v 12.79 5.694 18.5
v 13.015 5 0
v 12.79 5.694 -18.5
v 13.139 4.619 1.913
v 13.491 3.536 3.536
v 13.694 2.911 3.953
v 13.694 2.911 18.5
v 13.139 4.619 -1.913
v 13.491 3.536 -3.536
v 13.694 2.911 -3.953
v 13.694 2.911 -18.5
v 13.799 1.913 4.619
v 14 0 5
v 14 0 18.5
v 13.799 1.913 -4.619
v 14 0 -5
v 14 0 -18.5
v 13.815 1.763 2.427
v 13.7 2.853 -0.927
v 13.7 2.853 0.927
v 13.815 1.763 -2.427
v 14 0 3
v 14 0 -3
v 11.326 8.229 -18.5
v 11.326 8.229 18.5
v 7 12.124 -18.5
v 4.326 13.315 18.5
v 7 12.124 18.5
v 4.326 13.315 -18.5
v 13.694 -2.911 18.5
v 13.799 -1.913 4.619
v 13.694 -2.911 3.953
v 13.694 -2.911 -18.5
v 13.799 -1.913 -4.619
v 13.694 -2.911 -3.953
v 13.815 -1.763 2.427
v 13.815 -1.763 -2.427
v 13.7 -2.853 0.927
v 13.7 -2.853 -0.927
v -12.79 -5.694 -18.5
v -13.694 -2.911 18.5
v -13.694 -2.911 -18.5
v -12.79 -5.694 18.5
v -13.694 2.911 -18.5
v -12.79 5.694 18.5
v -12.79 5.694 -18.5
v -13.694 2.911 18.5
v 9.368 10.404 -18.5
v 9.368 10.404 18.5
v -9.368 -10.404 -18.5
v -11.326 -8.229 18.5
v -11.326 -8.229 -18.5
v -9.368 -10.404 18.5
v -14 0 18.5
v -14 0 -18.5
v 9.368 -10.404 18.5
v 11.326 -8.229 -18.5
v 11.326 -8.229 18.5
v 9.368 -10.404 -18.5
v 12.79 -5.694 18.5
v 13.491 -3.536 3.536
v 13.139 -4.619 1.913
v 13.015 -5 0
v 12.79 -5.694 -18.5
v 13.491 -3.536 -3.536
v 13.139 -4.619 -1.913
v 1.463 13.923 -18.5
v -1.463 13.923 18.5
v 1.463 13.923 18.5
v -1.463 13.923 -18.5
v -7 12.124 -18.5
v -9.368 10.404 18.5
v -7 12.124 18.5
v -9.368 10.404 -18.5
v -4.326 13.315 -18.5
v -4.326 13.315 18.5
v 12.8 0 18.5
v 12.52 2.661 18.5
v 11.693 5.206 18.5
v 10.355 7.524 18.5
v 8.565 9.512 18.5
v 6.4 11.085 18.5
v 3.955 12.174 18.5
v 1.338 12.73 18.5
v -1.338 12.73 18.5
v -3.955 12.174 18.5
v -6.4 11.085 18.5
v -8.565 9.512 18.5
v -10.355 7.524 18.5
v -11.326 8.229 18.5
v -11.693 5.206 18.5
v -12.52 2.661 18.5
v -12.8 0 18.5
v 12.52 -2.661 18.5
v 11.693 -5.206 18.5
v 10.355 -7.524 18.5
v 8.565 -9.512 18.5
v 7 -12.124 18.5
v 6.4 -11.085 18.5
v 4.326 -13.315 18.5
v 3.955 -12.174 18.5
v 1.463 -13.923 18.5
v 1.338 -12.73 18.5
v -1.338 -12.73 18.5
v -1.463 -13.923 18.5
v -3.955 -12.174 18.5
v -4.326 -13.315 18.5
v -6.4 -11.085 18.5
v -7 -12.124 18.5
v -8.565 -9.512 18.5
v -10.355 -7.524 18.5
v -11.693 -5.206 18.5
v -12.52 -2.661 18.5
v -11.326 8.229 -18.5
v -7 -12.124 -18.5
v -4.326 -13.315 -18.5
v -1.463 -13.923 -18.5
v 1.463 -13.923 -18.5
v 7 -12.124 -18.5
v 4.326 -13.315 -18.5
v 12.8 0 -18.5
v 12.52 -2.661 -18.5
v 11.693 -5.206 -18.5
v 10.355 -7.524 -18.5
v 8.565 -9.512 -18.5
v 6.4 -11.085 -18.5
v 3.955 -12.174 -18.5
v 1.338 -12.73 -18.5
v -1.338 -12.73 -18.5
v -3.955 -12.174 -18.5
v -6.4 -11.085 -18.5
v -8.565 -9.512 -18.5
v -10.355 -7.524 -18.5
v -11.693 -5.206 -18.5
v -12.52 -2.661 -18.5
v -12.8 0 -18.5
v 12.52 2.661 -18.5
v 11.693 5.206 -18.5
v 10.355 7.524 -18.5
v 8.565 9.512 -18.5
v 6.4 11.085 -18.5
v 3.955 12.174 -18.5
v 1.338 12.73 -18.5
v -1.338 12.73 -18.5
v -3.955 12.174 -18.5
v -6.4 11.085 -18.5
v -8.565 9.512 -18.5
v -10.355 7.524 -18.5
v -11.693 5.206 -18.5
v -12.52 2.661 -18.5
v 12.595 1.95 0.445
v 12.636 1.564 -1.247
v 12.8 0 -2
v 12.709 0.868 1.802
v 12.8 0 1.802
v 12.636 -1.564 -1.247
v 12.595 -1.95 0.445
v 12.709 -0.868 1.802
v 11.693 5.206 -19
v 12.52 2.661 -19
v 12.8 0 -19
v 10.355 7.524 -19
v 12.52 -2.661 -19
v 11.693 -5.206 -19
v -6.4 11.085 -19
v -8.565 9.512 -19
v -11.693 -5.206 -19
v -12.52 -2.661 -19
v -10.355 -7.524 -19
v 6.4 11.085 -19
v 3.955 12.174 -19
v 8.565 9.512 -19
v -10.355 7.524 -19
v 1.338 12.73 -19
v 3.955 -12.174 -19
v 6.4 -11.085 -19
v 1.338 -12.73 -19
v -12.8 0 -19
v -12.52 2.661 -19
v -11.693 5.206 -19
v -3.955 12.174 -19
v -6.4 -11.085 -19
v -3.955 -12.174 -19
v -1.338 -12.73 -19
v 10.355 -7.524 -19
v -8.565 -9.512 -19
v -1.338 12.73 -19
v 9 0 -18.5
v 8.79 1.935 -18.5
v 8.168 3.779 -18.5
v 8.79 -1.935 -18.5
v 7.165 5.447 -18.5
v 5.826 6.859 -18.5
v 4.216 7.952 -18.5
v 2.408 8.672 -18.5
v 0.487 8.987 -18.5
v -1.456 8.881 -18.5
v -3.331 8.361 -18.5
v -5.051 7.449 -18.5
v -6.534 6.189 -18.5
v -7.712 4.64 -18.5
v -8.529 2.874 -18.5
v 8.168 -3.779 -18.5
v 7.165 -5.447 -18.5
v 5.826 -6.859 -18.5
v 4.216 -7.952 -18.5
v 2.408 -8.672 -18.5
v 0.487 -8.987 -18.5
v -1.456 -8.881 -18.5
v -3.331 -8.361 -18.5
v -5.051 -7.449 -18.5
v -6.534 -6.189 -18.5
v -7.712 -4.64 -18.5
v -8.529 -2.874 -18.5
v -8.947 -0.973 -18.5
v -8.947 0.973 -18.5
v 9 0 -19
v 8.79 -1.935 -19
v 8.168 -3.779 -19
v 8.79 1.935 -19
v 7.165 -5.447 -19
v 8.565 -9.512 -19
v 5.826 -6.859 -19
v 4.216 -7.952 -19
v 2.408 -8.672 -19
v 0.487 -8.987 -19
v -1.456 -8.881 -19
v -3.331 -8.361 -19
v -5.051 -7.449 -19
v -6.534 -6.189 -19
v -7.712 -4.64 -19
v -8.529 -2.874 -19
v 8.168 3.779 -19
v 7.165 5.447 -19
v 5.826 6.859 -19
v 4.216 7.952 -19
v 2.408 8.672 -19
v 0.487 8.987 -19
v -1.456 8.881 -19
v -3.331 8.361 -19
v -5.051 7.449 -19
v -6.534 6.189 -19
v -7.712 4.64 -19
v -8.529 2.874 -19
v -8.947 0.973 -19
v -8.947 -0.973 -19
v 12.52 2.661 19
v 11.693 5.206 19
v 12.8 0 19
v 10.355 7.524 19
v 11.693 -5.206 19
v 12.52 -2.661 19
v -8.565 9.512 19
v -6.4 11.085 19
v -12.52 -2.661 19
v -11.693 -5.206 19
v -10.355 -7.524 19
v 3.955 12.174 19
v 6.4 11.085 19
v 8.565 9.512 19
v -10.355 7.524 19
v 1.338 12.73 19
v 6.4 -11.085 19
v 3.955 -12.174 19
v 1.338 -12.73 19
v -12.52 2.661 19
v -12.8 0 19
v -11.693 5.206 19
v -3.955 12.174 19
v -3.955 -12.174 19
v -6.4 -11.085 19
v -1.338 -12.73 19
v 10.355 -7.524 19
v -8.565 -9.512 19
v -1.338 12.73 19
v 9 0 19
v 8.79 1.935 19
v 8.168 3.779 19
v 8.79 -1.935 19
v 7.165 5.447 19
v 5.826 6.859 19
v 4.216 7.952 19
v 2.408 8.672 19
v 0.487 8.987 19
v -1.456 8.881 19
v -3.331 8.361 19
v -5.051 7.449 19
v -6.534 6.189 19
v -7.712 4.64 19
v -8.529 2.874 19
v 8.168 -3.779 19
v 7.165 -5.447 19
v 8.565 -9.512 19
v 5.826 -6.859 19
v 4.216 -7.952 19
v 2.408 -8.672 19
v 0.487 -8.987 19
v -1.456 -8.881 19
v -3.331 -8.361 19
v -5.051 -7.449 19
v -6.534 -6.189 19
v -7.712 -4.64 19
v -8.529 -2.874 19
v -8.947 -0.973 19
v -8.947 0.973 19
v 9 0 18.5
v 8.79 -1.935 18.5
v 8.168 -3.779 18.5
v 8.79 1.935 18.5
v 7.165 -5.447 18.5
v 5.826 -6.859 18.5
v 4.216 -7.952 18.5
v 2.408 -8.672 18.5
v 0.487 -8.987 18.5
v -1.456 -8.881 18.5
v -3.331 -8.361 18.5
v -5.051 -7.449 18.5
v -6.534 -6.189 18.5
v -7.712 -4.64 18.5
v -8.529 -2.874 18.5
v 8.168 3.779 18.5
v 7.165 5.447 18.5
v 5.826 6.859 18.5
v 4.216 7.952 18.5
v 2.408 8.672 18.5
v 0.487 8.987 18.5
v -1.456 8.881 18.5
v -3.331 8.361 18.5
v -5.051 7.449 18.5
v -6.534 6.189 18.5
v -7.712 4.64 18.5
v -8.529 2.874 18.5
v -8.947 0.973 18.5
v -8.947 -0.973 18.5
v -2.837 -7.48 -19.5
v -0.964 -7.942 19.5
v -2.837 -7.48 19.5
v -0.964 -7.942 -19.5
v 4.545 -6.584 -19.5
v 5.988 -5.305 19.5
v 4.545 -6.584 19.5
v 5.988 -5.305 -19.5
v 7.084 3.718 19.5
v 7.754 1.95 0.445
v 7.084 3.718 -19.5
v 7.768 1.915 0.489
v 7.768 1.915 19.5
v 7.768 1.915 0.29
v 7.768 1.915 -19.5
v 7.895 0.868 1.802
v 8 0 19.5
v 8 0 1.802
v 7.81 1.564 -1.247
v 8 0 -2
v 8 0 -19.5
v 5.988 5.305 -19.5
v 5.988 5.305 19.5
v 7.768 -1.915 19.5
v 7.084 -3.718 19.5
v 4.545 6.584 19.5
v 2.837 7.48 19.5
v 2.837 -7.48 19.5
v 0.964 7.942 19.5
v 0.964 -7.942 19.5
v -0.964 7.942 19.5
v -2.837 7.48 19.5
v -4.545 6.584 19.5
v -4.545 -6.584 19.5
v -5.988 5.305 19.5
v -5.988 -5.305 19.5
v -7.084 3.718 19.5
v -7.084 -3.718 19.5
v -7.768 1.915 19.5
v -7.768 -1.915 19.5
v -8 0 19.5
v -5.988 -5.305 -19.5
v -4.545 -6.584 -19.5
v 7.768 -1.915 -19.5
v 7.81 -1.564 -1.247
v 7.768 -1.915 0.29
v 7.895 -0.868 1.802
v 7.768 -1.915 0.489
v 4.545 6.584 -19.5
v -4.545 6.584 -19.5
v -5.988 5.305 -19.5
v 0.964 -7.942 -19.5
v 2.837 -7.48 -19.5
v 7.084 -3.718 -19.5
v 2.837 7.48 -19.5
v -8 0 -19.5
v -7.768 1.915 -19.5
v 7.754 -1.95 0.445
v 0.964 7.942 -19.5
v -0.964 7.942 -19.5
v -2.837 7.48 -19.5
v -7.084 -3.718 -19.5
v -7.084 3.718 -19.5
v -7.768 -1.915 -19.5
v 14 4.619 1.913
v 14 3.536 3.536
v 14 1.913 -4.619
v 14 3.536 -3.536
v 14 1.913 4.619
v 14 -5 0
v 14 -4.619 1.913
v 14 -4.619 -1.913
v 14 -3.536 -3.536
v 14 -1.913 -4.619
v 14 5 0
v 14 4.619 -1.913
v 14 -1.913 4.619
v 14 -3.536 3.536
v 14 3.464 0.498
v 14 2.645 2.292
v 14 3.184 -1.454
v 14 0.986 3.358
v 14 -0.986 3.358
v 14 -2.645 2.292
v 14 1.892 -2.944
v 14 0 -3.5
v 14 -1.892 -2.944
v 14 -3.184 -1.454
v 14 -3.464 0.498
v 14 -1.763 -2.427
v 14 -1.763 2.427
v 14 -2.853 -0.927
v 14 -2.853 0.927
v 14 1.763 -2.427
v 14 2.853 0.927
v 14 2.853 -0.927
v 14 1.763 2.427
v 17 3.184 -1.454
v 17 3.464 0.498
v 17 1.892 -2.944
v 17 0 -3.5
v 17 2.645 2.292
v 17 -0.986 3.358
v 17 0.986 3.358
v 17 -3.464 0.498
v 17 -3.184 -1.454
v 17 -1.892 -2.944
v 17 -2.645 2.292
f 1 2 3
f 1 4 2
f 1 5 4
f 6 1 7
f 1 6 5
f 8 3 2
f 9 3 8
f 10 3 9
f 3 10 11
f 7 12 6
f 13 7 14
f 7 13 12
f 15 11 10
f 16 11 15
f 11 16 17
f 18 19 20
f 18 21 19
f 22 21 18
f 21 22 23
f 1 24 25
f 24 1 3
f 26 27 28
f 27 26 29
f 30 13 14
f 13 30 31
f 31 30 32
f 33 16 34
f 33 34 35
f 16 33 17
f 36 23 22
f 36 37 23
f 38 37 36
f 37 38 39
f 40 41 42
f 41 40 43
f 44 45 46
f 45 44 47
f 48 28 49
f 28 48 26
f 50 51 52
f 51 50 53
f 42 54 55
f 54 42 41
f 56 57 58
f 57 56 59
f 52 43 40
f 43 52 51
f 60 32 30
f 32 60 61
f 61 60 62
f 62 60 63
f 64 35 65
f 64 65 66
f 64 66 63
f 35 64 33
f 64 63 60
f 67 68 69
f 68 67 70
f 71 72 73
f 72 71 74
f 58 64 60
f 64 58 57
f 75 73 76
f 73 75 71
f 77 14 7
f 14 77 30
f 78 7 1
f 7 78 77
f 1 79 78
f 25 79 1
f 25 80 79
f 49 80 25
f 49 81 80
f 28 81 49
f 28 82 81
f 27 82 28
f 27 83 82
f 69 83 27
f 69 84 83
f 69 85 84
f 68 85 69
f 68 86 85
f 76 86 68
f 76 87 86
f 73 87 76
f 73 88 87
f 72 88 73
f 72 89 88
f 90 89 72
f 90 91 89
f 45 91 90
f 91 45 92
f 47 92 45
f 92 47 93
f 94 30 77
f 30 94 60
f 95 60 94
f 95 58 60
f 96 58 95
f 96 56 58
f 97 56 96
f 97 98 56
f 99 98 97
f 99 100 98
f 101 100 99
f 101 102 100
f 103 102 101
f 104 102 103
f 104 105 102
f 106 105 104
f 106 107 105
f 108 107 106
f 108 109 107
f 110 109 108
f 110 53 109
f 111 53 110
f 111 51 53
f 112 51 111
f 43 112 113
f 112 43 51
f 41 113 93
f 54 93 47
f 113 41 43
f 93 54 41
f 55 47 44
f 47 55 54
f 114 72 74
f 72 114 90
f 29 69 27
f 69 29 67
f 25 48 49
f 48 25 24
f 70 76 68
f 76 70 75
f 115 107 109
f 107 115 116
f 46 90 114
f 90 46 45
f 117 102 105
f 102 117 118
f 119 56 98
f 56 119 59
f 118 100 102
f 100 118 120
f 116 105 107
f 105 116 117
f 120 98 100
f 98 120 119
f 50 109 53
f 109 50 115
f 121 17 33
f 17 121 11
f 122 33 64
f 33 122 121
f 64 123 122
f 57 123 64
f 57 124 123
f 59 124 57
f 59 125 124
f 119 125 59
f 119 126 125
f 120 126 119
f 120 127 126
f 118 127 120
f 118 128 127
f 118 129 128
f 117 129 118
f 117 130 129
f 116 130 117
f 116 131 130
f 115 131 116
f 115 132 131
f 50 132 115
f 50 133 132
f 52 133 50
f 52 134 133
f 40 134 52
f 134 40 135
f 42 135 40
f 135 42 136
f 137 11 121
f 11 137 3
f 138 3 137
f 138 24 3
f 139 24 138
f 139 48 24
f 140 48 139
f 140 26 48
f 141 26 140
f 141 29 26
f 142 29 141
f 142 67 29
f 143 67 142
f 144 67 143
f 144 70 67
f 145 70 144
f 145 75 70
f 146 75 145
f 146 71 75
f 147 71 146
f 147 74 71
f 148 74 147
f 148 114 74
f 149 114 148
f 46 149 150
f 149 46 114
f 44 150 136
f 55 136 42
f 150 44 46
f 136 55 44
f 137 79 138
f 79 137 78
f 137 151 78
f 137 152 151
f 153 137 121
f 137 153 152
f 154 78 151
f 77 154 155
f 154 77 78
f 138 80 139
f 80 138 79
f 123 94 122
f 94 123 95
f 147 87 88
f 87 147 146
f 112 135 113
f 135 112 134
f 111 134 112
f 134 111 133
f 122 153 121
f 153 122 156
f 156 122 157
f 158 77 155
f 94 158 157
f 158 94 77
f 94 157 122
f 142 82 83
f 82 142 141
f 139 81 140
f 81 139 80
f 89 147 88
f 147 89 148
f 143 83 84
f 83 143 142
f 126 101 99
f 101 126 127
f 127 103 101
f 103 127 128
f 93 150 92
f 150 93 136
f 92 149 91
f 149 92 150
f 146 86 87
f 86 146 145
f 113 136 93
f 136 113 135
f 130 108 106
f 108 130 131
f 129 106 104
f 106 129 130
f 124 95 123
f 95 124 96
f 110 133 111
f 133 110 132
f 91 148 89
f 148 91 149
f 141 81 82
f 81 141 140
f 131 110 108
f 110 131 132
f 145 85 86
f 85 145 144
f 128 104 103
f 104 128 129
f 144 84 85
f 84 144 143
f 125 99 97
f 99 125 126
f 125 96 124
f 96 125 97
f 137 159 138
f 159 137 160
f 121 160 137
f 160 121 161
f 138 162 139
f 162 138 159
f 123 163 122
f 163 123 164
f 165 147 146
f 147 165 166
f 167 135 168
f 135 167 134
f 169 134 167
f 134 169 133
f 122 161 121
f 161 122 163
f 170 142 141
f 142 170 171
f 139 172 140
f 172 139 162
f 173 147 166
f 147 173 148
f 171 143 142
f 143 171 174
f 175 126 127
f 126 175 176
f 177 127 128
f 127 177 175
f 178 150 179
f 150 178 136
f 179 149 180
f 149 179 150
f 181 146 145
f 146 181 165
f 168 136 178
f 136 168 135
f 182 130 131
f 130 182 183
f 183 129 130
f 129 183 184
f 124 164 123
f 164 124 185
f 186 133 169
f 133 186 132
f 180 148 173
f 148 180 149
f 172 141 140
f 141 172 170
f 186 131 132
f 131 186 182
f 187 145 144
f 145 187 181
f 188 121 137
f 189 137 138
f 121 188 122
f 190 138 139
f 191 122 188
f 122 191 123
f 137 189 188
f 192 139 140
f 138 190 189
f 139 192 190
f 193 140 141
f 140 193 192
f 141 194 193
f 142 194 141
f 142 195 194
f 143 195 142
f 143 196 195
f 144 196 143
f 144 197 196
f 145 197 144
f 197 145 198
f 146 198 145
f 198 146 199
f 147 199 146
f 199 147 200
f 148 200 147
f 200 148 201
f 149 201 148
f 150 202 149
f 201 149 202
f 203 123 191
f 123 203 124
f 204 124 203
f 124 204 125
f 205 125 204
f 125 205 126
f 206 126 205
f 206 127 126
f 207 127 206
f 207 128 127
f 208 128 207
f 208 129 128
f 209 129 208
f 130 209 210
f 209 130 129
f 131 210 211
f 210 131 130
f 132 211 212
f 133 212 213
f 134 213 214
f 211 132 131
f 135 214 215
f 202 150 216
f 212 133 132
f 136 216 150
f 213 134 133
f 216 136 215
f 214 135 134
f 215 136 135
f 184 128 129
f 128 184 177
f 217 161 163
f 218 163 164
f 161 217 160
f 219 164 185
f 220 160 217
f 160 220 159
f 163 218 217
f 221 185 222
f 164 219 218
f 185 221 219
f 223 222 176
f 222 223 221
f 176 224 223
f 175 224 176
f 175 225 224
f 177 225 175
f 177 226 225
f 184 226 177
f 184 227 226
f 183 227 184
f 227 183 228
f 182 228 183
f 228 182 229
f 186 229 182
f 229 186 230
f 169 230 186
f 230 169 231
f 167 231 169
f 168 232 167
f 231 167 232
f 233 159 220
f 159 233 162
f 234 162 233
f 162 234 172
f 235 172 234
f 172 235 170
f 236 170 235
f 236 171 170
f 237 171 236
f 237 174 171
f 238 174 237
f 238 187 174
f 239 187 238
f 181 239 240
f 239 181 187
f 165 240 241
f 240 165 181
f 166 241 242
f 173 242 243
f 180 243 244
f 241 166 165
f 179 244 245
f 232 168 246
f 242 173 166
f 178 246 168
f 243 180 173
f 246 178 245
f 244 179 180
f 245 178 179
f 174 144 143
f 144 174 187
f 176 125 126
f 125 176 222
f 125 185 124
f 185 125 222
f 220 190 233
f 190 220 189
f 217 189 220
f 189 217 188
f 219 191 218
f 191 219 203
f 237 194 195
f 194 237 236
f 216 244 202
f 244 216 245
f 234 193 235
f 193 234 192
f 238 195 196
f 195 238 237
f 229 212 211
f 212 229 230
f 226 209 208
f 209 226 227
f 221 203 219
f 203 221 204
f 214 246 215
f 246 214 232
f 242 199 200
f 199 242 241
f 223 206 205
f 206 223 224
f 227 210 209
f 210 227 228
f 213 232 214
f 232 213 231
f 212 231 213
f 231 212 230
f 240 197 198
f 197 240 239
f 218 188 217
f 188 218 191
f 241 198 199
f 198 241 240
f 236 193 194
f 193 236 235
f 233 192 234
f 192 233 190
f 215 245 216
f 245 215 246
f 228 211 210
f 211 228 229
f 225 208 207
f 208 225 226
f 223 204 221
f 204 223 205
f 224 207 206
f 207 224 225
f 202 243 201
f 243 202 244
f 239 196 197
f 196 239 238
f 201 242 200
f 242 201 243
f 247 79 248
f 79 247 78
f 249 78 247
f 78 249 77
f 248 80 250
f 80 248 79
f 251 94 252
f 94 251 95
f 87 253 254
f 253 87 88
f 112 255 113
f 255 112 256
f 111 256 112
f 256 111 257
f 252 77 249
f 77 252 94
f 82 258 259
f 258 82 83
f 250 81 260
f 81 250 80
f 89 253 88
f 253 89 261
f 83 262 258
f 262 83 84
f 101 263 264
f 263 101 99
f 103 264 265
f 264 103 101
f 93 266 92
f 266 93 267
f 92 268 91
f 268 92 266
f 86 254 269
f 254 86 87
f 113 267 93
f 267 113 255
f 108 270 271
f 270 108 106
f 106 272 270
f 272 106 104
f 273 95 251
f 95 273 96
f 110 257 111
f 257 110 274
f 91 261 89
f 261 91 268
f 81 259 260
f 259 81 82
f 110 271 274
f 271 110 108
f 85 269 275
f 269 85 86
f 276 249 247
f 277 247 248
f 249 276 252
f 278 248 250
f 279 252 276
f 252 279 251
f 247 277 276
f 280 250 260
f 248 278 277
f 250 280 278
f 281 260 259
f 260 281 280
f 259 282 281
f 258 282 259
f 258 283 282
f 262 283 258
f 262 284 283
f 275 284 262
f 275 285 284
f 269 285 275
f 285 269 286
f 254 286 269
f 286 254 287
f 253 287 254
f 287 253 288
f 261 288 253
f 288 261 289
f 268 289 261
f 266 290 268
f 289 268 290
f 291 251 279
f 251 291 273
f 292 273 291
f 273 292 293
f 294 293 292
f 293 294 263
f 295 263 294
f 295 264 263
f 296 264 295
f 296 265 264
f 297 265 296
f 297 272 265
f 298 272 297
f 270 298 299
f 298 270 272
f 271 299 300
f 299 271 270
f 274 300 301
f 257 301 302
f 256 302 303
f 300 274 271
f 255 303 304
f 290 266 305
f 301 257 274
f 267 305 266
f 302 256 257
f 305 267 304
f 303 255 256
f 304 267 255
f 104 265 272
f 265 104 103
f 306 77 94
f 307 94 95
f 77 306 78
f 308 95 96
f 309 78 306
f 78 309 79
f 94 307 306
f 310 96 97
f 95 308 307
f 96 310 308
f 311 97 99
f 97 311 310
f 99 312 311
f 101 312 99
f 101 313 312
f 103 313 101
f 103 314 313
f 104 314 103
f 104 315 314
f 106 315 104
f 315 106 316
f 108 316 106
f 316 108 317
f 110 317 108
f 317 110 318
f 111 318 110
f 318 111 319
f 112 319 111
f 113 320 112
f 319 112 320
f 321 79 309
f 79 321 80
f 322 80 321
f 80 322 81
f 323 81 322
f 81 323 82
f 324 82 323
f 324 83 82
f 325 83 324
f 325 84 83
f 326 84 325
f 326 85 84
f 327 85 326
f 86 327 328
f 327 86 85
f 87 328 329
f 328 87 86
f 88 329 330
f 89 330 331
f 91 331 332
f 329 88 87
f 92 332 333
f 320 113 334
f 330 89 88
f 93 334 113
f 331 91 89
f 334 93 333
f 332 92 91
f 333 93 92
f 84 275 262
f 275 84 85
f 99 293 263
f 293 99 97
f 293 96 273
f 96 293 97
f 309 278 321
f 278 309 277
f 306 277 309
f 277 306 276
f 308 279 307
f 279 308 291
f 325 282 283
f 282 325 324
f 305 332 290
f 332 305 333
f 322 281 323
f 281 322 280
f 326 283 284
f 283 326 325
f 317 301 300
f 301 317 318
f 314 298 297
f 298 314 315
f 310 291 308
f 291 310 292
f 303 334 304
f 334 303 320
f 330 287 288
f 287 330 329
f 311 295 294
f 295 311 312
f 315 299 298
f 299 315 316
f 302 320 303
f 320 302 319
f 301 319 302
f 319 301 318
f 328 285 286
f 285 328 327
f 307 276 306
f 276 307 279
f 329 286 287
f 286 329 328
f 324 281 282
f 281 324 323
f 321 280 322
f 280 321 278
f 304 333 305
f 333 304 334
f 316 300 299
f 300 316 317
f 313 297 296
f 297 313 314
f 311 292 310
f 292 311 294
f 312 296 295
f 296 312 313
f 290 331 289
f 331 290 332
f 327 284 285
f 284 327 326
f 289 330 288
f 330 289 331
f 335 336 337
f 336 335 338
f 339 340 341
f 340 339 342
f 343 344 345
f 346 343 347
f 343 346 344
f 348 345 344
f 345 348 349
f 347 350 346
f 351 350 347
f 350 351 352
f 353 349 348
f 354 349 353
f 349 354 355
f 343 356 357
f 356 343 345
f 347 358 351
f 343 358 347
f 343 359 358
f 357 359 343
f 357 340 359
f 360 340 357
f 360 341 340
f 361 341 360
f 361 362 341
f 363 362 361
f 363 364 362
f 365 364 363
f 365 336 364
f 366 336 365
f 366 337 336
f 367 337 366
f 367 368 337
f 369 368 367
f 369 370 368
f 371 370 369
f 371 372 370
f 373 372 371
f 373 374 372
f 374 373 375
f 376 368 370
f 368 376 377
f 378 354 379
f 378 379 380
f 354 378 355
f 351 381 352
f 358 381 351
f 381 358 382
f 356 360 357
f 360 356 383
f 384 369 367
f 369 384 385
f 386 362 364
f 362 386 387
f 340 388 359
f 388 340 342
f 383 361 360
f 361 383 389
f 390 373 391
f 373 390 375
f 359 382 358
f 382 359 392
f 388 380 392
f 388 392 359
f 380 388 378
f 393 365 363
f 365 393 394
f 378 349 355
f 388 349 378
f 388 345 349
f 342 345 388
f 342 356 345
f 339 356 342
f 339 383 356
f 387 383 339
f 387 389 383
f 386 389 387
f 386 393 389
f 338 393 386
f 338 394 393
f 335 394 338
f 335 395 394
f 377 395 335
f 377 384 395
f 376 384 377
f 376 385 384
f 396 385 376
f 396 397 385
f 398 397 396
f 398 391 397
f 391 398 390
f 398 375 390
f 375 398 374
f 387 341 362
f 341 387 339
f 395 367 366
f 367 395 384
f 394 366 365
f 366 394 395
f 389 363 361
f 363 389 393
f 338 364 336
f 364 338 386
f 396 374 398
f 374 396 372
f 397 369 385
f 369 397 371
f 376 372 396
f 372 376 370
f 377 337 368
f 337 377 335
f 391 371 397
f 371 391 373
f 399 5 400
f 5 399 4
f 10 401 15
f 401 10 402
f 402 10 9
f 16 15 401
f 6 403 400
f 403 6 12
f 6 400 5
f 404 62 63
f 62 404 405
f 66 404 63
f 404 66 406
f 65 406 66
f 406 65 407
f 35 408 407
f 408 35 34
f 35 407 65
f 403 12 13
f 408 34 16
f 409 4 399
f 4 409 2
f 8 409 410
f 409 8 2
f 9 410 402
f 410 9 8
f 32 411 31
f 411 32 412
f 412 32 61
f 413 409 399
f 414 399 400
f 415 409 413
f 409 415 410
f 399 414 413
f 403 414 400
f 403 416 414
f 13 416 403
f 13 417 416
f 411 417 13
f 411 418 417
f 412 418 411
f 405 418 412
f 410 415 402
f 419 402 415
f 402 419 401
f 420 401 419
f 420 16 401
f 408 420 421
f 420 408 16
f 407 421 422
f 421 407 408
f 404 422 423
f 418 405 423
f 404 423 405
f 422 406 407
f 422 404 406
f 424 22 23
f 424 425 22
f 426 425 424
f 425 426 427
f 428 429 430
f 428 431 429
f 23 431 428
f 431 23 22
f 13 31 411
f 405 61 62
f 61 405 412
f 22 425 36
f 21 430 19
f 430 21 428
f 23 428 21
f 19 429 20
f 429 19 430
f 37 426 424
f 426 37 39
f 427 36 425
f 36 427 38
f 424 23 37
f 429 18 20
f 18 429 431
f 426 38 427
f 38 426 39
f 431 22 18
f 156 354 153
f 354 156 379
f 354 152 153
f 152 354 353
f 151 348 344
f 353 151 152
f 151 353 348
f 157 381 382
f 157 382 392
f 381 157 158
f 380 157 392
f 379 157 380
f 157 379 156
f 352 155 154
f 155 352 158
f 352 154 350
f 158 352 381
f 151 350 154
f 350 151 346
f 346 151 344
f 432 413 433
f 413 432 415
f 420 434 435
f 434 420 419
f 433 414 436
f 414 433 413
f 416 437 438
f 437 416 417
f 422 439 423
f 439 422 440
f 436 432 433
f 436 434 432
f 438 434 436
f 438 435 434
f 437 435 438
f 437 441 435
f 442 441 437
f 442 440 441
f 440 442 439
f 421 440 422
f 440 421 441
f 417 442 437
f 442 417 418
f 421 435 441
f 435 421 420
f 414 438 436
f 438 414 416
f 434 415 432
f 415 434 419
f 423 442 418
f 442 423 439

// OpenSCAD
// Parameters
bore_diameter_mm = 16; //[8:32:0.1]
outer_diameter_mm = 28; //[14:56:0.1]
length_mm = 37; //[18.5:74:0.1]
wall_thickness_mm = 1.2; //[0.6:2.4:0.1]
seal_lip_thickness_mm = 0.5; //[0.2:1.5:0.1]
seal_radial_thickness_mm = 1.0; //[0.5:2.5:0.1]
grooves_enabled = 0; //[0:1:1]
groove_depth_mm = 0; //[0:2:0.1]
groove_length_mm = 0; //[0:10:0.1]
groove_spacing_mm = 0; //[0:30:0.1]
overlap_mm = 1; //[0.5:2:0.1]
screw_shank_diameter_mm = 4; //[2:8:0.1]
screw_head_diameter_mm = 7; //[4:14:0.1]
screw_head_height_mm = 3; //[1.5:6:0.1]
screw_length_mm = 16; //[8:40:0.5]
washer_outer_diameter_mm = 10; //[6:20:0.1]
washer_thickness_mm = 1; //[0.5:3:0.1]

// Linear Bearing - complete geometry
module linear_bearing() {
  color("Silver") {
    // Outer casing
    difference() {
      cylinder(r=outer_diameter_mm/2, h=length_mm, center=true);
      cylinder(r=outer_diameter_mm/2 - wall_thickness_mm, h=length_mm + 2*overlap_mm, center=true);
    }
    
    // Inner bore
    translate([0, 0, 0])
      cylinder(r=bore_diameter_mm/2, h=length_mm + 2*overlap_mm, center=true);
    
    // End seal rings
    for (z = [-1, 1]) {
      translate([0, 0, z * (length_mm/2 - seal_lip_thickness_mm/2 + overlap_mm/2)])
        difference() {
          cylinder(r=outer_diameter_mm/2 - wall_thickness_mm, h=seal_lip_thickness_mm, center=true);
          cylinder(r=bore_diameter_mm/2 + overlap_mm, h=seal_lip_thickness_mm + 2*overlap_mm, center=true);
        }
    }
    
    // Optional grooves
    if (grooves_enabled) {
      for (z = [-groove_spacing_mm/2, groove_spacing_mm/2]) {
        translate([0, 0, z])
          cylinder(r=outer_diameter_mm/2 - groove_depth_mm, h=groove_length_mm + 2*overlap_mm, center=true);
      }
    }
  }
}

// Screw and Washer - complete geometry
module screw_and_washer() {
  color("DimGray") {
    // Screw shank
    translate([outer_diameter_mm/2 - overlap_mm - screw_length_mm/2, 0, 0])
      rotate([0, 90, 0])
      cylinder(r=screw_shank_diameter_mm/2, h=screw_length_mm, center=true);
    
    // Screw head
    translate([outer_diameter_mm/2 + washer_thickness_mm + screw_head_height_mm/2 - overlap_mm, 0, 0])
      rotate([0, 90, 0])
      cylinder(r=screw_head_diameter_mm/2, h=screw_head_height_mm, center=true);
    
    // Washer
    translate([outer_diameter_mm/2 + washer_thickness_mm/2 - overlap_mm, 0, 0])
      rotate([0, 90, 0])
      difference() {
        cylinder(r=washer_outer_diameter_mm/2, h=washer_thickness_mm, center=true);
        cylinder(r=screw_shank_diameter_mm/2 + overlap_mm, h=washer_thickness_mm + 2*overlap_mm, center=true);
      }
  }
}

// Assembly
module assembly() {
  linear_bearing();
  screw_and_washer();
}

assembly();
